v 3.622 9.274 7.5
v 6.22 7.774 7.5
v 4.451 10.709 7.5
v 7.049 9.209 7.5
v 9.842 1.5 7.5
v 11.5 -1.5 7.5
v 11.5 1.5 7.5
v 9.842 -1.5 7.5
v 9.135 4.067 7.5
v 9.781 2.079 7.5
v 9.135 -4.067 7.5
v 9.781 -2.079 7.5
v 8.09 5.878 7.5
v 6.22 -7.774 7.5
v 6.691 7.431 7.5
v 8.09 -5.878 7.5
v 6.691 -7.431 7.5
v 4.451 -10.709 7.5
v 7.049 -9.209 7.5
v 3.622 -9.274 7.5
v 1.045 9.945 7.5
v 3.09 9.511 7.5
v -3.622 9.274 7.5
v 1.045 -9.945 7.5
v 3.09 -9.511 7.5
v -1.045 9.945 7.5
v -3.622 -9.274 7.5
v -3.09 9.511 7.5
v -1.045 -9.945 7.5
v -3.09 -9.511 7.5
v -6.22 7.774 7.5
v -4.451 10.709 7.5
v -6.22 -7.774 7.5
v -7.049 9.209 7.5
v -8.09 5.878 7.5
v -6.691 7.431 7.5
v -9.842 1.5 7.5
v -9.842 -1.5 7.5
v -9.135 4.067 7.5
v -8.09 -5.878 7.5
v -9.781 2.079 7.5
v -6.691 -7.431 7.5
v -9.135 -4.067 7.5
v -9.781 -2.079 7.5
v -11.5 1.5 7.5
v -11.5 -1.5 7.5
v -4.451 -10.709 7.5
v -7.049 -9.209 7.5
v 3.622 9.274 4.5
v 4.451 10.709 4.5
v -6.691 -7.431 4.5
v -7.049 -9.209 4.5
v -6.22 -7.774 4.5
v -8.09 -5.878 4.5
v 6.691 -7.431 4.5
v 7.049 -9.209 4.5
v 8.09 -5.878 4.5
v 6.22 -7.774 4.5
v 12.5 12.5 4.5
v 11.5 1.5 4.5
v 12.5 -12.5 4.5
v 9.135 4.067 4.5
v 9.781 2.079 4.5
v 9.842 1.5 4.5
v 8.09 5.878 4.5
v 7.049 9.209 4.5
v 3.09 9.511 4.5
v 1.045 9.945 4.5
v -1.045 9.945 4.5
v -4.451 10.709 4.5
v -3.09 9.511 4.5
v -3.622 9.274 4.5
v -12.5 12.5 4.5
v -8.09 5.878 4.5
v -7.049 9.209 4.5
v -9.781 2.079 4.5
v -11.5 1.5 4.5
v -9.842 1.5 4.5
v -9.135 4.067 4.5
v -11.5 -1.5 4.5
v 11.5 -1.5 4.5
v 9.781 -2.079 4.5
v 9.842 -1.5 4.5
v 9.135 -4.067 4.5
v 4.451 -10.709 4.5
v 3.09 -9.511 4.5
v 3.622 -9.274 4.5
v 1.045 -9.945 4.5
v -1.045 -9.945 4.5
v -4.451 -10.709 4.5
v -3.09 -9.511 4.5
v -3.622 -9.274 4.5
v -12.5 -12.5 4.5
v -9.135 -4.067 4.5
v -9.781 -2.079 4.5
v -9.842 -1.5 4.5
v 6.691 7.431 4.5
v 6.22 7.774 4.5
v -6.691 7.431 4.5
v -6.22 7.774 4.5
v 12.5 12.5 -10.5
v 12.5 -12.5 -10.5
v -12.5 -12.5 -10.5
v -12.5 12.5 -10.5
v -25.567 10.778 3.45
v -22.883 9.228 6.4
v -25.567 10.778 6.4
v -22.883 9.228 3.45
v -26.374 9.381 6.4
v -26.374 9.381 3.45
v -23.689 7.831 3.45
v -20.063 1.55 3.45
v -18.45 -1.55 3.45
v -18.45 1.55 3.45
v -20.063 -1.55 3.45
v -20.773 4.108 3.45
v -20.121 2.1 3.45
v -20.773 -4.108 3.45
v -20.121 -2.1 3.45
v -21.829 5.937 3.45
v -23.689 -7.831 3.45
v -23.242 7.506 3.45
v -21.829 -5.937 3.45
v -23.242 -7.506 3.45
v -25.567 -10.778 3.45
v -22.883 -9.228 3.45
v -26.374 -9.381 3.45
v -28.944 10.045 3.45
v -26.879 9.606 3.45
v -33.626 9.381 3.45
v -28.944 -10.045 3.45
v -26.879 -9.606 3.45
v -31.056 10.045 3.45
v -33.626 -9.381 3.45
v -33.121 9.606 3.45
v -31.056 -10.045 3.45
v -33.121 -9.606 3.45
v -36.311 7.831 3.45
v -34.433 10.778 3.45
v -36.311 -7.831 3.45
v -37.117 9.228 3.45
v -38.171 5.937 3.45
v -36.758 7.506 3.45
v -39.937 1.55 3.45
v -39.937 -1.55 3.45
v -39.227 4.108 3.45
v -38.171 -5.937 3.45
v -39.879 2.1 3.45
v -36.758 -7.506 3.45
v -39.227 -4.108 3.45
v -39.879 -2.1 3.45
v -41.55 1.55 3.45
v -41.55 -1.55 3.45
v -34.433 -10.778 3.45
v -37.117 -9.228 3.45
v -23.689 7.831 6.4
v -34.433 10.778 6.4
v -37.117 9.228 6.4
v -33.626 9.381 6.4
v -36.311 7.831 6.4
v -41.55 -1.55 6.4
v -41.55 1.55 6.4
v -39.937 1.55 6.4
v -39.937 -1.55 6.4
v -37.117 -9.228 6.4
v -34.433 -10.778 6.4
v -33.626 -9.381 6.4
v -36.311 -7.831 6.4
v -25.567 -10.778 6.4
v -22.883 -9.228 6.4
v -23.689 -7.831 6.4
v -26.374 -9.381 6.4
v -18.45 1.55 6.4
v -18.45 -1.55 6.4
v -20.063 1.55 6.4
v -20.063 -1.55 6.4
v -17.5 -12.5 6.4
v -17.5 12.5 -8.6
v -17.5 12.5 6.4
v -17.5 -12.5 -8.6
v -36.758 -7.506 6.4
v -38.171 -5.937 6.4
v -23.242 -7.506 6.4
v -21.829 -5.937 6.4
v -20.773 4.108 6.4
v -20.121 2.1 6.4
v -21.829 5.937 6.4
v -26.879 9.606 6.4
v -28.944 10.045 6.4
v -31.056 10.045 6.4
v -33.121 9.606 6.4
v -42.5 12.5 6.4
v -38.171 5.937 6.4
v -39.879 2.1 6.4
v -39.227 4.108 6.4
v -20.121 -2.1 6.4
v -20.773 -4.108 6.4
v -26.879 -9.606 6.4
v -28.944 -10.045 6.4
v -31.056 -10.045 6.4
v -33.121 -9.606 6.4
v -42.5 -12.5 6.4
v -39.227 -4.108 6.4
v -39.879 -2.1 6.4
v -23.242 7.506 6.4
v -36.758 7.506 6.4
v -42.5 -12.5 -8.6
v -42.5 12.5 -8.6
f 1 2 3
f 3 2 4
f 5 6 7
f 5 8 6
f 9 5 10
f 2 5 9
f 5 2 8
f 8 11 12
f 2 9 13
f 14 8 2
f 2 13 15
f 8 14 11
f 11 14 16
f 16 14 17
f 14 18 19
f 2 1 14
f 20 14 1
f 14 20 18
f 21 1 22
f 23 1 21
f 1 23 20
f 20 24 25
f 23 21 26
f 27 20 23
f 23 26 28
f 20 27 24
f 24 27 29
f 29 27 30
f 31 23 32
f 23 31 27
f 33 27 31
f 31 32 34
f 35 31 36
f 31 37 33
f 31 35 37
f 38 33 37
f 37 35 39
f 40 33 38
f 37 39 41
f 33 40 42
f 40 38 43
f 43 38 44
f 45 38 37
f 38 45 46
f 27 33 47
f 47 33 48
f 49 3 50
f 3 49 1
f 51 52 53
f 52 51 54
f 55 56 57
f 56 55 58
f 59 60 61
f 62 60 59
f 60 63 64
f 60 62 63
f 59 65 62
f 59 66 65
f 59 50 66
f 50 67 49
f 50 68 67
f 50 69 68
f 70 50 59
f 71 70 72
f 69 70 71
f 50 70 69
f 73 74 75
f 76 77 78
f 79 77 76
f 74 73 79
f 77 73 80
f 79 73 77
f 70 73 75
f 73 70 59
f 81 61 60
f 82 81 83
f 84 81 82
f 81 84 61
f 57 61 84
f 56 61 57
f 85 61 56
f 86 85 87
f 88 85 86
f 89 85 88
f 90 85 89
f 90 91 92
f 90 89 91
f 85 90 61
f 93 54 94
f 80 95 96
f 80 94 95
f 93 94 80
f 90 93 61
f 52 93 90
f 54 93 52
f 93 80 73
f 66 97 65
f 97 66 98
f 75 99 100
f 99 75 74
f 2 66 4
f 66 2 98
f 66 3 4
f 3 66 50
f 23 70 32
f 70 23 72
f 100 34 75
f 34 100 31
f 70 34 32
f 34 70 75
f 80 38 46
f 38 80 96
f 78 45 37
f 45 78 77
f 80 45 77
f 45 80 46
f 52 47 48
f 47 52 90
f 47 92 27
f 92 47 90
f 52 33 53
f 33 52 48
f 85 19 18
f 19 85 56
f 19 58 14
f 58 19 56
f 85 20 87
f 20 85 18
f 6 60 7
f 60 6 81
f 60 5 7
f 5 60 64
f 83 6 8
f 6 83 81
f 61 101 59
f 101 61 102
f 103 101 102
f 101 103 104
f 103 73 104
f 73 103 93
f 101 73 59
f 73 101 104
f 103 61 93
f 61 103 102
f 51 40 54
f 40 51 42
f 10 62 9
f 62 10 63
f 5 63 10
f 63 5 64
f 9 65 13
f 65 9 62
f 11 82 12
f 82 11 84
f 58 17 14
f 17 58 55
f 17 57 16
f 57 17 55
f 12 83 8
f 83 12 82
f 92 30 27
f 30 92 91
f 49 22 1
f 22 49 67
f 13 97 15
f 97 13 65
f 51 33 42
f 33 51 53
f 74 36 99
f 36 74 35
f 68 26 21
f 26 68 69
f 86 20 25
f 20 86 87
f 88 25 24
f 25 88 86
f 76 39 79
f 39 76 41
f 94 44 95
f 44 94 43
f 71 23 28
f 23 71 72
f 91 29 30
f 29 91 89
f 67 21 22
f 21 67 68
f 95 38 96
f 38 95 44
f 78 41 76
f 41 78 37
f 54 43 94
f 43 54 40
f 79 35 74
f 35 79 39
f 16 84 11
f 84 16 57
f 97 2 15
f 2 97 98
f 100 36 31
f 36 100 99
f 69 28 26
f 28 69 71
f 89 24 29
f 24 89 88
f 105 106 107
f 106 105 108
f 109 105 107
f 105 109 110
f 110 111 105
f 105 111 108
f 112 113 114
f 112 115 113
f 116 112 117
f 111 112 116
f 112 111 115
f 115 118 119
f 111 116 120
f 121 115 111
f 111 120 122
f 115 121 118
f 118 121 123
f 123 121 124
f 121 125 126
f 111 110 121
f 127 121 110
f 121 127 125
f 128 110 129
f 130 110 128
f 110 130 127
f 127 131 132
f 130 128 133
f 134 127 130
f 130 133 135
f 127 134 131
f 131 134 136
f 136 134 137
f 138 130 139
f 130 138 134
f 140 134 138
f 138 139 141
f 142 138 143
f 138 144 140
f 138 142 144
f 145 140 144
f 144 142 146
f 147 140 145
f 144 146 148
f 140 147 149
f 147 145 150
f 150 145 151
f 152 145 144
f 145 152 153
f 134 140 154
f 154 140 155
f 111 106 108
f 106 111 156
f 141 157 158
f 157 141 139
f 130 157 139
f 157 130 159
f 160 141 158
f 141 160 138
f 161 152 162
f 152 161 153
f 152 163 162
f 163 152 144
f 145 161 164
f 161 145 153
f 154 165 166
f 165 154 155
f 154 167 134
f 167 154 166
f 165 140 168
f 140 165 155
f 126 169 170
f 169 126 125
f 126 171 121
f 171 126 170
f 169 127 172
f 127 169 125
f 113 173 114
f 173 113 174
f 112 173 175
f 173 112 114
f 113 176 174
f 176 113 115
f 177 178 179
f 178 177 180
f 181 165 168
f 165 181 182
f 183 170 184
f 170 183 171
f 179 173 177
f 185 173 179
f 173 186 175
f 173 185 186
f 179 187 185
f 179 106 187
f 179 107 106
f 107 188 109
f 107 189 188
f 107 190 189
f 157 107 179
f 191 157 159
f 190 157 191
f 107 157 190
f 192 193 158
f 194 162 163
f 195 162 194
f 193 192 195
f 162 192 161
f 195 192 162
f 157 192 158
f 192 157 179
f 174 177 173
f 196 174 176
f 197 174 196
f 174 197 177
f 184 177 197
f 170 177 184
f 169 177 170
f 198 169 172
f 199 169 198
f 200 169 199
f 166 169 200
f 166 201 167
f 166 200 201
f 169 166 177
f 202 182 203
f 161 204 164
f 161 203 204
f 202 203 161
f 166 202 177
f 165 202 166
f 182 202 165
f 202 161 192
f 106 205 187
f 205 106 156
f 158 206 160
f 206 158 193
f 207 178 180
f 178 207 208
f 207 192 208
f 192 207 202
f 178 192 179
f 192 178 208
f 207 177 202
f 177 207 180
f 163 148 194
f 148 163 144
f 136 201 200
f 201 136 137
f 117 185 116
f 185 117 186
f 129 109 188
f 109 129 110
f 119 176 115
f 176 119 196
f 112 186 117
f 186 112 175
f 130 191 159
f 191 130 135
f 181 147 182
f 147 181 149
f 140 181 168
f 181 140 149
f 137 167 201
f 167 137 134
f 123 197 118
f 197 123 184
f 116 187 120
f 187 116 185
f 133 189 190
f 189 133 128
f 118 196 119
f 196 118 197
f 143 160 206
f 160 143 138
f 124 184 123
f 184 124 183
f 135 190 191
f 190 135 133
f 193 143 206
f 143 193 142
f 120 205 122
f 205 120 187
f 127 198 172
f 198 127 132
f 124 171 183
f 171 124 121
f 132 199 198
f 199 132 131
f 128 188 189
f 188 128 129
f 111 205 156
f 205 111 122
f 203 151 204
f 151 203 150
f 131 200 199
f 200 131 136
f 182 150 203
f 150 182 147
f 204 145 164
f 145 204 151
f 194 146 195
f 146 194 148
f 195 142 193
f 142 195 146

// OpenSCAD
count = 6;
radius = 10;
err = 0.1;
translate([0,0,6]){ 
translate([0,0,-9]){
cube([25,25,15],center = true);}
cylinder(h=3, r=10, center=true);

for(i=[1:count]){
 
    rotate([0,0,,i*(360/count)])
    translate([radius,0,0])
    cube([3,3,3],center=true);
    }}

translate([-30,0,5]){    
difference(){
translate([0,0,-6.1]){
cube([25,25,15],center = true);}
cylinder(h=3+err, r=10+err, center=true);
for(i=[1:count]){
    rotate([0,0,,i*(360/count)])
    translate([radius,0,0])
    cube(3+err,center=true);
    }}}
